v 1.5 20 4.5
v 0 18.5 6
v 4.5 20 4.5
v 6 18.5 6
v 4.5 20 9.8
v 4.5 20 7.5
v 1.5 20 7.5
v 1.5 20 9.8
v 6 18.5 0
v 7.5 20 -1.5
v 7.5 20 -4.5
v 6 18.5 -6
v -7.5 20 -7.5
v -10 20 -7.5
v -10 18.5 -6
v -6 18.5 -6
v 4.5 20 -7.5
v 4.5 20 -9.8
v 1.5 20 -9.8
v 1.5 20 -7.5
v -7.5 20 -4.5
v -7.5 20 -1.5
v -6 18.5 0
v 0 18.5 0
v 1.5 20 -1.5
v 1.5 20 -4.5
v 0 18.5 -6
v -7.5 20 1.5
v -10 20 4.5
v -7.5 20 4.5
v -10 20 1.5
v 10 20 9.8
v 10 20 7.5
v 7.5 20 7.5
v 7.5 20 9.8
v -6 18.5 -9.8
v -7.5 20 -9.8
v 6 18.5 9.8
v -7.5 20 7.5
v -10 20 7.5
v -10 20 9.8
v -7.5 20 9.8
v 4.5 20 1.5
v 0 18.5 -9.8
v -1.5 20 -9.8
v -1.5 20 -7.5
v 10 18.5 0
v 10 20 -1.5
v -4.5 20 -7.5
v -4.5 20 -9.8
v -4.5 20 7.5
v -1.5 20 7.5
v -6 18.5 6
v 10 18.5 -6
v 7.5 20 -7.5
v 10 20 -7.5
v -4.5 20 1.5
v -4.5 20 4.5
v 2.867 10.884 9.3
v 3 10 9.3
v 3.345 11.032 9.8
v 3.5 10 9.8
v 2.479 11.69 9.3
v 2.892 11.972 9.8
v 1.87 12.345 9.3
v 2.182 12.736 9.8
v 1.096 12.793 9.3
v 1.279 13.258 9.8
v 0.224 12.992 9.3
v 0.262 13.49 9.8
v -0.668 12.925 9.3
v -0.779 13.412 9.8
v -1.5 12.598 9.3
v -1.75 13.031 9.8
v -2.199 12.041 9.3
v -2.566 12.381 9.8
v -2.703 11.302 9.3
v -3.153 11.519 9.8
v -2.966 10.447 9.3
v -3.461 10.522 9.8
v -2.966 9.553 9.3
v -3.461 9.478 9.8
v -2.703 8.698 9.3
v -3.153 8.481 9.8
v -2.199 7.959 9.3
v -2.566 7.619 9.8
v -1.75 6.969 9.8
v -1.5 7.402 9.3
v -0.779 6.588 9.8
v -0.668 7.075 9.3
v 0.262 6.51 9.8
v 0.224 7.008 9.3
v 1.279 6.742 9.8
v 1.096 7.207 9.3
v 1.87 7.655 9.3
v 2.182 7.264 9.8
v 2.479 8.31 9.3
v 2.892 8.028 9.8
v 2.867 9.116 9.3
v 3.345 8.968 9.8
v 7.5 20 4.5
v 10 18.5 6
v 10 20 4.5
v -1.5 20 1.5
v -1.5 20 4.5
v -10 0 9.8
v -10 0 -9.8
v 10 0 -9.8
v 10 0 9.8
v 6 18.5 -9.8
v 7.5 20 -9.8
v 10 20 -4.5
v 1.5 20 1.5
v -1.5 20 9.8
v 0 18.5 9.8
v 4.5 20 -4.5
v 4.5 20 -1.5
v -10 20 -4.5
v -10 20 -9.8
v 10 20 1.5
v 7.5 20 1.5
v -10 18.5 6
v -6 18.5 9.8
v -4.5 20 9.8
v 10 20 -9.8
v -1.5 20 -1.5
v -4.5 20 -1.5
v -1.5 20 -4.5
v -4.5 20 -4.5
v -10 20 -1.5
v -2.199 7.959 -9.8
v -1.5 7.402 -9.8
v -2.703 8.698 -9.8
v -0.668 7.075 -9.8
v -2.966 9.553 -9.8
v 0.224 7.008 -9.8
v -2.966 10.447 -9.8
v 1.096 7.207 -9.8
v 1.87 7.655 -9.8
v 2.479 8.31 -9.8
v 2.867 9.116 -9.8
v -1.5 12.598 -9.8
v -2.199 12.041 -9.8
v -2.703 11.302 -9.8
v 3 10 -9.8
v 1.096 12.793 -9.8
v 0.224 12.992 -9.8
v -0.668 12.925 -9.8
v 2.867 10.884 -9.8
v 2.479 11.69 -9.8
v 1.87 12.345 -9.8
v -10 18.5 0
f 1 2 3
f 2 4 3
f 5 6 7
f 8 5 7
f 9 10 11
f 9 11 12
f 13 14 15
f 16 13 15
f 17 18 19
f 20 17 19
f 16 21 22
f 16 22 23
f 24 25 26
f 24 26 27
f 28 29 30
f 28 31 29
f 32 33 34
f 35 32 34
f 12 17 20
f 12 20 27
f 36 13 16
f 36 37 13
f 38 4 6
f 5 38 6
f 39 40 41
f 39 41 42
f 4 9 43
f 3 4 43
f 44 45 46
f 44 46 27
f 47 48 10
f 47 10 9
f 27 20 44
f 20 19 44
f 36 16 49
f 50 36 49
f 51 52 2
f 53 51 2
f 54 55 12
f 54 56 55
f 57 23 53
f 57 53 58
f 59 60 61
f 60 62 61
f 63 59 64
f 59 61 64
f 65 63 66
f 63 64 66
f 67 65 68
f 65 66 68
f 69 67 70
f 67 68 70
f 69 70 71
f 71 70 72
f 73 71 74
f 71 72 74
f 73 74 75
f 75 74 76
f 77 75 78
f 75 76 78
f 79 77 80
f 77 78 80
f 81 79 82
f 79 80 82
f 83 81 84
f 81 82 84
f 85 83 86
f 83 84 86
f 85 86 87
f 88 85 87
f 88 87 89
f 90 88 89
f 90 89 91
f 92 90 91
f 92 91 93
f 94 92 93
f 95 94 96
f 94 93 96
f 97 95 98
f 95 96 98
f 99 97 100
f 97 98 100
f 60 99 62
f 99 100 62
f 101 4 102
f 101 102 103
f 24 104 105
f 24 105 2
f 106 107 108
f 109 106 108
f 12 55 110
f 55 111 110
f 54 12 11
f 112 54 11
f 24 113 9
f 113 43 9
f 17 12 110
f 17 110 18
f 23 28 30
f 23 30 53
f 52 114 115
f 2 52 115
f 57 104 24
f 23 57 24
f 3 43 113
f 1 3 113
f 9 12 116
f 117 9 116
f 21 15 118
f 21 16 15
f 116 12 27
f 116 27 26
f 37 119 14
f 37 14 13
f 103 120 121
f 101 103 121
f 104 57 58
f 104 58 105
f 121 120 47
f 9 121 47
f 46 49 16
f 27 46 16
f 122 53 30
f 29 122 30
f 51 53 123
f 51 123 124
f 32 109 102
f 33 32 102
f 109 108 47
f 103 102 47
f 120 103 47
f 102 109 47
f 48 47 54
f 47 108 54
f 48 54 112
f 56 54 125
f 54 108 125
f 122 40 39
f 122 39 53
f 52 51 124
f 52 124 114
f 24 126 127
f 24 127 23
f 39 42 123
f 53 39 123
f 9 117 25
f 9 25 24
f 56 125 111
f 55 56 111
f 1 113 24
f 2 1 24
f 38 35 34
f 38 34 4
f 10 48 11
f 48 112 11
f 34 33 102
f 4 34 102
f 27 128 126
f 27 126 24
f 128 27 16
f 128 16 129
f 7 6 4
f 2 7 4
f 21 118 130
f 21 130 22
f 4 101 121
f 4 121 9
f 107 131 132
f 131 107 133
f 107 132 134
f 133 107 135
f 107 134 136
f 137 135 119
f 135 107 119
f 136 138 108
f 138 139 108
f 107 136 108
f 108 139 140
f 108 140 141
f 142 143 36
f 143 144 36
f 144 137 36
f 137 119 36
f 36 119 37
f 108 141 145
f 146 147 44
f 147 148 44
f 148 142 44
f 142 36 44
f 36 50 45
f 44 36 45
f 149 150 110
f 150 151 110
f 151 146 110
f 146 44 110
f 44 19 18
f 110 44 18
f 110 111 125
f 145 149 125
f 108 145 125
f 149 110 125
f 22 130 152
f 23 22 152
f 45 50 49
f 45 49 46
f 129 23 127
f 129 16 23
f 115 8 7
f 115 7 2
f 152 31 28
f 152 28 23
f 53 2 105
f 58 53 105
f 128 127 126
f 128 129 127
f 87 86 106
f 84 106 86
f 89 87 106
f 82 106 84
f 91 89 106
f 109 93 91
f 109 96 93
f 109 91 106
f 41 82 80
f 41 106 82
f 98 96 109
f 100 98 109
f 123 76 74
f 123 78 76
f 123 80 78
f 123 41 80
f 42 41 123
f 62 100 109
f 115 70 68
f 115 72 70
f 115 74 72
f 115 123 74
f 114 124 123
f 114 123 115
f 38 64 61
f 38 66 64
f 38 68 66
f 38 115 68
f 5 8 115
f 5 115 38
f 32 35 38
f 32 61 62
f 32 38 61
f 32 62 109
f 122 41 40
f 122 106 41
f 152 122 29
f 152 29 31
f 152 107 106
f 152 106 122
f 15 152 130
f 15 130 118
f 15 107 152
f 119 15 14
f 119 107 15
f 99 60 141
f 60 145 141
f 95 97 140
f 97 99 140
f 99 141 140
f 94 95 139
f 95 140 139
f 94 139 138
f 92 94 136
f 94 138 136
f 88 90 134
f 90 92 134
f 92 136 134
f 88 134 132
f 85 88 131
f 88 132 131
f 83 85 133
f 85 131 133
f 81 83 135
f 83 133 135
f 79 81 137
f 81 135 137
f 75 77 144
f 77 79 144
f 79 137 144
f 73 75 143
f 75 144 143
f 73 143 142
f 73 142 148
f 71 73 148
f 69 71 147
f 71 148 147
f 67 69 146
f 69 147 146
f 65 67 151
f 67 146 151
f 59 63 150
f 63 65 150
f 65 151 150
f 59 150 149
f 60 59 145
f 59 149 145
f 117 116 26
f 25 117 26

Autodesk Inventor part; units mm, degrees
ref_plane "YZ Plane" through (0, 0, 0) normal (1, 0, 0) x (0, 1, 0)
ref_plane "XZ Plane" through (0, 0, 0) normal (0, 1, 0) x (-1, 0, 0)
ref_plane "XY Plane" through (0, 0, 0) normal (0, 0, 1) x (1, 0, 0)
sketch "Sketch1" plane through (0, 0, 0) normal (0, 0, 1) x (1, 0, 0)
  line L0 (-10, 0) -> (0, 0)
  line L1 (-10, 0) -> (-10, 20)
  line L2 (-10, 20) -> (-7.5, 20)
  line L3 (-4.5, 20) -> (-1.5, 20)
  line L4 (-7.5, 20) -> (-6, 18.5)
  line L5 (-6, 18.5) -> (-4.5, 20)
  line L6 (-1.5, 20) -> (0, 18.5)
  line L7 (0, 18.5) -> (0, 0) construction
  line L8 (10, 0) -> (0, 0)
  line L9 (10, 0) -> (10, 20)
  line L10 (10, 20) -> (7.5, 20)
  line L11 (4.5, 20) -> (1.5, 20)
  line L12 (7.5, 20) -> (6, 18.5)
  line L13 (6, 18.5) -> (4.5, 20)
  line L14 (1.5, 20) -> (0, 18.5)
  circle A0 centre (0, 10) radius 3
  dimension "d0" = 6
  dimension "d1" = 20
  dimension "d2" = 20
  dimension "d3" = 1.5
  dimension "d4" = 6
  dimension "d5" = 10
extrude "Extrusion1" add sketch "Sketch1" along normal mid plane 19.6
sketch "Sketch2" plane through (10, 0, 9.8) normal (1, 0, 0) x (0, 0, -1)
  line L0 (19.6, 20) -> (0, 20) projected
  line L1 (9.8, 20) -> (9.8, 0) construction
  line L2 (0, 13) -> (19.6, 13) projected
  line L3 (2.3, 20) -> (3.8, 18.5)
  line L4 (3.8, 18.5) -> (5.3, 20)
  line L5 (19.6, 20) -> (0, 20) projected
  line L6 (8.3, 20) -> (9.8, 18.5)
  line L7 (17.3, 20) -> (15.8, 18.5)
  line L8 (15.8, 18.5) -> (14.3, 20)
  line L9 (11.3, 20) -> (9.8, 18.5)
  dimension "d8" = 1.5
  dimension "d9" = 6
extrude "Extrusion2" cut sketch "Sketch2" against normal through all
chamfer "Chamfer1" distance 0.5 angle 45 1 edges at (-3, 10, 9.8)
properties part number "Foot" material "Steel"
